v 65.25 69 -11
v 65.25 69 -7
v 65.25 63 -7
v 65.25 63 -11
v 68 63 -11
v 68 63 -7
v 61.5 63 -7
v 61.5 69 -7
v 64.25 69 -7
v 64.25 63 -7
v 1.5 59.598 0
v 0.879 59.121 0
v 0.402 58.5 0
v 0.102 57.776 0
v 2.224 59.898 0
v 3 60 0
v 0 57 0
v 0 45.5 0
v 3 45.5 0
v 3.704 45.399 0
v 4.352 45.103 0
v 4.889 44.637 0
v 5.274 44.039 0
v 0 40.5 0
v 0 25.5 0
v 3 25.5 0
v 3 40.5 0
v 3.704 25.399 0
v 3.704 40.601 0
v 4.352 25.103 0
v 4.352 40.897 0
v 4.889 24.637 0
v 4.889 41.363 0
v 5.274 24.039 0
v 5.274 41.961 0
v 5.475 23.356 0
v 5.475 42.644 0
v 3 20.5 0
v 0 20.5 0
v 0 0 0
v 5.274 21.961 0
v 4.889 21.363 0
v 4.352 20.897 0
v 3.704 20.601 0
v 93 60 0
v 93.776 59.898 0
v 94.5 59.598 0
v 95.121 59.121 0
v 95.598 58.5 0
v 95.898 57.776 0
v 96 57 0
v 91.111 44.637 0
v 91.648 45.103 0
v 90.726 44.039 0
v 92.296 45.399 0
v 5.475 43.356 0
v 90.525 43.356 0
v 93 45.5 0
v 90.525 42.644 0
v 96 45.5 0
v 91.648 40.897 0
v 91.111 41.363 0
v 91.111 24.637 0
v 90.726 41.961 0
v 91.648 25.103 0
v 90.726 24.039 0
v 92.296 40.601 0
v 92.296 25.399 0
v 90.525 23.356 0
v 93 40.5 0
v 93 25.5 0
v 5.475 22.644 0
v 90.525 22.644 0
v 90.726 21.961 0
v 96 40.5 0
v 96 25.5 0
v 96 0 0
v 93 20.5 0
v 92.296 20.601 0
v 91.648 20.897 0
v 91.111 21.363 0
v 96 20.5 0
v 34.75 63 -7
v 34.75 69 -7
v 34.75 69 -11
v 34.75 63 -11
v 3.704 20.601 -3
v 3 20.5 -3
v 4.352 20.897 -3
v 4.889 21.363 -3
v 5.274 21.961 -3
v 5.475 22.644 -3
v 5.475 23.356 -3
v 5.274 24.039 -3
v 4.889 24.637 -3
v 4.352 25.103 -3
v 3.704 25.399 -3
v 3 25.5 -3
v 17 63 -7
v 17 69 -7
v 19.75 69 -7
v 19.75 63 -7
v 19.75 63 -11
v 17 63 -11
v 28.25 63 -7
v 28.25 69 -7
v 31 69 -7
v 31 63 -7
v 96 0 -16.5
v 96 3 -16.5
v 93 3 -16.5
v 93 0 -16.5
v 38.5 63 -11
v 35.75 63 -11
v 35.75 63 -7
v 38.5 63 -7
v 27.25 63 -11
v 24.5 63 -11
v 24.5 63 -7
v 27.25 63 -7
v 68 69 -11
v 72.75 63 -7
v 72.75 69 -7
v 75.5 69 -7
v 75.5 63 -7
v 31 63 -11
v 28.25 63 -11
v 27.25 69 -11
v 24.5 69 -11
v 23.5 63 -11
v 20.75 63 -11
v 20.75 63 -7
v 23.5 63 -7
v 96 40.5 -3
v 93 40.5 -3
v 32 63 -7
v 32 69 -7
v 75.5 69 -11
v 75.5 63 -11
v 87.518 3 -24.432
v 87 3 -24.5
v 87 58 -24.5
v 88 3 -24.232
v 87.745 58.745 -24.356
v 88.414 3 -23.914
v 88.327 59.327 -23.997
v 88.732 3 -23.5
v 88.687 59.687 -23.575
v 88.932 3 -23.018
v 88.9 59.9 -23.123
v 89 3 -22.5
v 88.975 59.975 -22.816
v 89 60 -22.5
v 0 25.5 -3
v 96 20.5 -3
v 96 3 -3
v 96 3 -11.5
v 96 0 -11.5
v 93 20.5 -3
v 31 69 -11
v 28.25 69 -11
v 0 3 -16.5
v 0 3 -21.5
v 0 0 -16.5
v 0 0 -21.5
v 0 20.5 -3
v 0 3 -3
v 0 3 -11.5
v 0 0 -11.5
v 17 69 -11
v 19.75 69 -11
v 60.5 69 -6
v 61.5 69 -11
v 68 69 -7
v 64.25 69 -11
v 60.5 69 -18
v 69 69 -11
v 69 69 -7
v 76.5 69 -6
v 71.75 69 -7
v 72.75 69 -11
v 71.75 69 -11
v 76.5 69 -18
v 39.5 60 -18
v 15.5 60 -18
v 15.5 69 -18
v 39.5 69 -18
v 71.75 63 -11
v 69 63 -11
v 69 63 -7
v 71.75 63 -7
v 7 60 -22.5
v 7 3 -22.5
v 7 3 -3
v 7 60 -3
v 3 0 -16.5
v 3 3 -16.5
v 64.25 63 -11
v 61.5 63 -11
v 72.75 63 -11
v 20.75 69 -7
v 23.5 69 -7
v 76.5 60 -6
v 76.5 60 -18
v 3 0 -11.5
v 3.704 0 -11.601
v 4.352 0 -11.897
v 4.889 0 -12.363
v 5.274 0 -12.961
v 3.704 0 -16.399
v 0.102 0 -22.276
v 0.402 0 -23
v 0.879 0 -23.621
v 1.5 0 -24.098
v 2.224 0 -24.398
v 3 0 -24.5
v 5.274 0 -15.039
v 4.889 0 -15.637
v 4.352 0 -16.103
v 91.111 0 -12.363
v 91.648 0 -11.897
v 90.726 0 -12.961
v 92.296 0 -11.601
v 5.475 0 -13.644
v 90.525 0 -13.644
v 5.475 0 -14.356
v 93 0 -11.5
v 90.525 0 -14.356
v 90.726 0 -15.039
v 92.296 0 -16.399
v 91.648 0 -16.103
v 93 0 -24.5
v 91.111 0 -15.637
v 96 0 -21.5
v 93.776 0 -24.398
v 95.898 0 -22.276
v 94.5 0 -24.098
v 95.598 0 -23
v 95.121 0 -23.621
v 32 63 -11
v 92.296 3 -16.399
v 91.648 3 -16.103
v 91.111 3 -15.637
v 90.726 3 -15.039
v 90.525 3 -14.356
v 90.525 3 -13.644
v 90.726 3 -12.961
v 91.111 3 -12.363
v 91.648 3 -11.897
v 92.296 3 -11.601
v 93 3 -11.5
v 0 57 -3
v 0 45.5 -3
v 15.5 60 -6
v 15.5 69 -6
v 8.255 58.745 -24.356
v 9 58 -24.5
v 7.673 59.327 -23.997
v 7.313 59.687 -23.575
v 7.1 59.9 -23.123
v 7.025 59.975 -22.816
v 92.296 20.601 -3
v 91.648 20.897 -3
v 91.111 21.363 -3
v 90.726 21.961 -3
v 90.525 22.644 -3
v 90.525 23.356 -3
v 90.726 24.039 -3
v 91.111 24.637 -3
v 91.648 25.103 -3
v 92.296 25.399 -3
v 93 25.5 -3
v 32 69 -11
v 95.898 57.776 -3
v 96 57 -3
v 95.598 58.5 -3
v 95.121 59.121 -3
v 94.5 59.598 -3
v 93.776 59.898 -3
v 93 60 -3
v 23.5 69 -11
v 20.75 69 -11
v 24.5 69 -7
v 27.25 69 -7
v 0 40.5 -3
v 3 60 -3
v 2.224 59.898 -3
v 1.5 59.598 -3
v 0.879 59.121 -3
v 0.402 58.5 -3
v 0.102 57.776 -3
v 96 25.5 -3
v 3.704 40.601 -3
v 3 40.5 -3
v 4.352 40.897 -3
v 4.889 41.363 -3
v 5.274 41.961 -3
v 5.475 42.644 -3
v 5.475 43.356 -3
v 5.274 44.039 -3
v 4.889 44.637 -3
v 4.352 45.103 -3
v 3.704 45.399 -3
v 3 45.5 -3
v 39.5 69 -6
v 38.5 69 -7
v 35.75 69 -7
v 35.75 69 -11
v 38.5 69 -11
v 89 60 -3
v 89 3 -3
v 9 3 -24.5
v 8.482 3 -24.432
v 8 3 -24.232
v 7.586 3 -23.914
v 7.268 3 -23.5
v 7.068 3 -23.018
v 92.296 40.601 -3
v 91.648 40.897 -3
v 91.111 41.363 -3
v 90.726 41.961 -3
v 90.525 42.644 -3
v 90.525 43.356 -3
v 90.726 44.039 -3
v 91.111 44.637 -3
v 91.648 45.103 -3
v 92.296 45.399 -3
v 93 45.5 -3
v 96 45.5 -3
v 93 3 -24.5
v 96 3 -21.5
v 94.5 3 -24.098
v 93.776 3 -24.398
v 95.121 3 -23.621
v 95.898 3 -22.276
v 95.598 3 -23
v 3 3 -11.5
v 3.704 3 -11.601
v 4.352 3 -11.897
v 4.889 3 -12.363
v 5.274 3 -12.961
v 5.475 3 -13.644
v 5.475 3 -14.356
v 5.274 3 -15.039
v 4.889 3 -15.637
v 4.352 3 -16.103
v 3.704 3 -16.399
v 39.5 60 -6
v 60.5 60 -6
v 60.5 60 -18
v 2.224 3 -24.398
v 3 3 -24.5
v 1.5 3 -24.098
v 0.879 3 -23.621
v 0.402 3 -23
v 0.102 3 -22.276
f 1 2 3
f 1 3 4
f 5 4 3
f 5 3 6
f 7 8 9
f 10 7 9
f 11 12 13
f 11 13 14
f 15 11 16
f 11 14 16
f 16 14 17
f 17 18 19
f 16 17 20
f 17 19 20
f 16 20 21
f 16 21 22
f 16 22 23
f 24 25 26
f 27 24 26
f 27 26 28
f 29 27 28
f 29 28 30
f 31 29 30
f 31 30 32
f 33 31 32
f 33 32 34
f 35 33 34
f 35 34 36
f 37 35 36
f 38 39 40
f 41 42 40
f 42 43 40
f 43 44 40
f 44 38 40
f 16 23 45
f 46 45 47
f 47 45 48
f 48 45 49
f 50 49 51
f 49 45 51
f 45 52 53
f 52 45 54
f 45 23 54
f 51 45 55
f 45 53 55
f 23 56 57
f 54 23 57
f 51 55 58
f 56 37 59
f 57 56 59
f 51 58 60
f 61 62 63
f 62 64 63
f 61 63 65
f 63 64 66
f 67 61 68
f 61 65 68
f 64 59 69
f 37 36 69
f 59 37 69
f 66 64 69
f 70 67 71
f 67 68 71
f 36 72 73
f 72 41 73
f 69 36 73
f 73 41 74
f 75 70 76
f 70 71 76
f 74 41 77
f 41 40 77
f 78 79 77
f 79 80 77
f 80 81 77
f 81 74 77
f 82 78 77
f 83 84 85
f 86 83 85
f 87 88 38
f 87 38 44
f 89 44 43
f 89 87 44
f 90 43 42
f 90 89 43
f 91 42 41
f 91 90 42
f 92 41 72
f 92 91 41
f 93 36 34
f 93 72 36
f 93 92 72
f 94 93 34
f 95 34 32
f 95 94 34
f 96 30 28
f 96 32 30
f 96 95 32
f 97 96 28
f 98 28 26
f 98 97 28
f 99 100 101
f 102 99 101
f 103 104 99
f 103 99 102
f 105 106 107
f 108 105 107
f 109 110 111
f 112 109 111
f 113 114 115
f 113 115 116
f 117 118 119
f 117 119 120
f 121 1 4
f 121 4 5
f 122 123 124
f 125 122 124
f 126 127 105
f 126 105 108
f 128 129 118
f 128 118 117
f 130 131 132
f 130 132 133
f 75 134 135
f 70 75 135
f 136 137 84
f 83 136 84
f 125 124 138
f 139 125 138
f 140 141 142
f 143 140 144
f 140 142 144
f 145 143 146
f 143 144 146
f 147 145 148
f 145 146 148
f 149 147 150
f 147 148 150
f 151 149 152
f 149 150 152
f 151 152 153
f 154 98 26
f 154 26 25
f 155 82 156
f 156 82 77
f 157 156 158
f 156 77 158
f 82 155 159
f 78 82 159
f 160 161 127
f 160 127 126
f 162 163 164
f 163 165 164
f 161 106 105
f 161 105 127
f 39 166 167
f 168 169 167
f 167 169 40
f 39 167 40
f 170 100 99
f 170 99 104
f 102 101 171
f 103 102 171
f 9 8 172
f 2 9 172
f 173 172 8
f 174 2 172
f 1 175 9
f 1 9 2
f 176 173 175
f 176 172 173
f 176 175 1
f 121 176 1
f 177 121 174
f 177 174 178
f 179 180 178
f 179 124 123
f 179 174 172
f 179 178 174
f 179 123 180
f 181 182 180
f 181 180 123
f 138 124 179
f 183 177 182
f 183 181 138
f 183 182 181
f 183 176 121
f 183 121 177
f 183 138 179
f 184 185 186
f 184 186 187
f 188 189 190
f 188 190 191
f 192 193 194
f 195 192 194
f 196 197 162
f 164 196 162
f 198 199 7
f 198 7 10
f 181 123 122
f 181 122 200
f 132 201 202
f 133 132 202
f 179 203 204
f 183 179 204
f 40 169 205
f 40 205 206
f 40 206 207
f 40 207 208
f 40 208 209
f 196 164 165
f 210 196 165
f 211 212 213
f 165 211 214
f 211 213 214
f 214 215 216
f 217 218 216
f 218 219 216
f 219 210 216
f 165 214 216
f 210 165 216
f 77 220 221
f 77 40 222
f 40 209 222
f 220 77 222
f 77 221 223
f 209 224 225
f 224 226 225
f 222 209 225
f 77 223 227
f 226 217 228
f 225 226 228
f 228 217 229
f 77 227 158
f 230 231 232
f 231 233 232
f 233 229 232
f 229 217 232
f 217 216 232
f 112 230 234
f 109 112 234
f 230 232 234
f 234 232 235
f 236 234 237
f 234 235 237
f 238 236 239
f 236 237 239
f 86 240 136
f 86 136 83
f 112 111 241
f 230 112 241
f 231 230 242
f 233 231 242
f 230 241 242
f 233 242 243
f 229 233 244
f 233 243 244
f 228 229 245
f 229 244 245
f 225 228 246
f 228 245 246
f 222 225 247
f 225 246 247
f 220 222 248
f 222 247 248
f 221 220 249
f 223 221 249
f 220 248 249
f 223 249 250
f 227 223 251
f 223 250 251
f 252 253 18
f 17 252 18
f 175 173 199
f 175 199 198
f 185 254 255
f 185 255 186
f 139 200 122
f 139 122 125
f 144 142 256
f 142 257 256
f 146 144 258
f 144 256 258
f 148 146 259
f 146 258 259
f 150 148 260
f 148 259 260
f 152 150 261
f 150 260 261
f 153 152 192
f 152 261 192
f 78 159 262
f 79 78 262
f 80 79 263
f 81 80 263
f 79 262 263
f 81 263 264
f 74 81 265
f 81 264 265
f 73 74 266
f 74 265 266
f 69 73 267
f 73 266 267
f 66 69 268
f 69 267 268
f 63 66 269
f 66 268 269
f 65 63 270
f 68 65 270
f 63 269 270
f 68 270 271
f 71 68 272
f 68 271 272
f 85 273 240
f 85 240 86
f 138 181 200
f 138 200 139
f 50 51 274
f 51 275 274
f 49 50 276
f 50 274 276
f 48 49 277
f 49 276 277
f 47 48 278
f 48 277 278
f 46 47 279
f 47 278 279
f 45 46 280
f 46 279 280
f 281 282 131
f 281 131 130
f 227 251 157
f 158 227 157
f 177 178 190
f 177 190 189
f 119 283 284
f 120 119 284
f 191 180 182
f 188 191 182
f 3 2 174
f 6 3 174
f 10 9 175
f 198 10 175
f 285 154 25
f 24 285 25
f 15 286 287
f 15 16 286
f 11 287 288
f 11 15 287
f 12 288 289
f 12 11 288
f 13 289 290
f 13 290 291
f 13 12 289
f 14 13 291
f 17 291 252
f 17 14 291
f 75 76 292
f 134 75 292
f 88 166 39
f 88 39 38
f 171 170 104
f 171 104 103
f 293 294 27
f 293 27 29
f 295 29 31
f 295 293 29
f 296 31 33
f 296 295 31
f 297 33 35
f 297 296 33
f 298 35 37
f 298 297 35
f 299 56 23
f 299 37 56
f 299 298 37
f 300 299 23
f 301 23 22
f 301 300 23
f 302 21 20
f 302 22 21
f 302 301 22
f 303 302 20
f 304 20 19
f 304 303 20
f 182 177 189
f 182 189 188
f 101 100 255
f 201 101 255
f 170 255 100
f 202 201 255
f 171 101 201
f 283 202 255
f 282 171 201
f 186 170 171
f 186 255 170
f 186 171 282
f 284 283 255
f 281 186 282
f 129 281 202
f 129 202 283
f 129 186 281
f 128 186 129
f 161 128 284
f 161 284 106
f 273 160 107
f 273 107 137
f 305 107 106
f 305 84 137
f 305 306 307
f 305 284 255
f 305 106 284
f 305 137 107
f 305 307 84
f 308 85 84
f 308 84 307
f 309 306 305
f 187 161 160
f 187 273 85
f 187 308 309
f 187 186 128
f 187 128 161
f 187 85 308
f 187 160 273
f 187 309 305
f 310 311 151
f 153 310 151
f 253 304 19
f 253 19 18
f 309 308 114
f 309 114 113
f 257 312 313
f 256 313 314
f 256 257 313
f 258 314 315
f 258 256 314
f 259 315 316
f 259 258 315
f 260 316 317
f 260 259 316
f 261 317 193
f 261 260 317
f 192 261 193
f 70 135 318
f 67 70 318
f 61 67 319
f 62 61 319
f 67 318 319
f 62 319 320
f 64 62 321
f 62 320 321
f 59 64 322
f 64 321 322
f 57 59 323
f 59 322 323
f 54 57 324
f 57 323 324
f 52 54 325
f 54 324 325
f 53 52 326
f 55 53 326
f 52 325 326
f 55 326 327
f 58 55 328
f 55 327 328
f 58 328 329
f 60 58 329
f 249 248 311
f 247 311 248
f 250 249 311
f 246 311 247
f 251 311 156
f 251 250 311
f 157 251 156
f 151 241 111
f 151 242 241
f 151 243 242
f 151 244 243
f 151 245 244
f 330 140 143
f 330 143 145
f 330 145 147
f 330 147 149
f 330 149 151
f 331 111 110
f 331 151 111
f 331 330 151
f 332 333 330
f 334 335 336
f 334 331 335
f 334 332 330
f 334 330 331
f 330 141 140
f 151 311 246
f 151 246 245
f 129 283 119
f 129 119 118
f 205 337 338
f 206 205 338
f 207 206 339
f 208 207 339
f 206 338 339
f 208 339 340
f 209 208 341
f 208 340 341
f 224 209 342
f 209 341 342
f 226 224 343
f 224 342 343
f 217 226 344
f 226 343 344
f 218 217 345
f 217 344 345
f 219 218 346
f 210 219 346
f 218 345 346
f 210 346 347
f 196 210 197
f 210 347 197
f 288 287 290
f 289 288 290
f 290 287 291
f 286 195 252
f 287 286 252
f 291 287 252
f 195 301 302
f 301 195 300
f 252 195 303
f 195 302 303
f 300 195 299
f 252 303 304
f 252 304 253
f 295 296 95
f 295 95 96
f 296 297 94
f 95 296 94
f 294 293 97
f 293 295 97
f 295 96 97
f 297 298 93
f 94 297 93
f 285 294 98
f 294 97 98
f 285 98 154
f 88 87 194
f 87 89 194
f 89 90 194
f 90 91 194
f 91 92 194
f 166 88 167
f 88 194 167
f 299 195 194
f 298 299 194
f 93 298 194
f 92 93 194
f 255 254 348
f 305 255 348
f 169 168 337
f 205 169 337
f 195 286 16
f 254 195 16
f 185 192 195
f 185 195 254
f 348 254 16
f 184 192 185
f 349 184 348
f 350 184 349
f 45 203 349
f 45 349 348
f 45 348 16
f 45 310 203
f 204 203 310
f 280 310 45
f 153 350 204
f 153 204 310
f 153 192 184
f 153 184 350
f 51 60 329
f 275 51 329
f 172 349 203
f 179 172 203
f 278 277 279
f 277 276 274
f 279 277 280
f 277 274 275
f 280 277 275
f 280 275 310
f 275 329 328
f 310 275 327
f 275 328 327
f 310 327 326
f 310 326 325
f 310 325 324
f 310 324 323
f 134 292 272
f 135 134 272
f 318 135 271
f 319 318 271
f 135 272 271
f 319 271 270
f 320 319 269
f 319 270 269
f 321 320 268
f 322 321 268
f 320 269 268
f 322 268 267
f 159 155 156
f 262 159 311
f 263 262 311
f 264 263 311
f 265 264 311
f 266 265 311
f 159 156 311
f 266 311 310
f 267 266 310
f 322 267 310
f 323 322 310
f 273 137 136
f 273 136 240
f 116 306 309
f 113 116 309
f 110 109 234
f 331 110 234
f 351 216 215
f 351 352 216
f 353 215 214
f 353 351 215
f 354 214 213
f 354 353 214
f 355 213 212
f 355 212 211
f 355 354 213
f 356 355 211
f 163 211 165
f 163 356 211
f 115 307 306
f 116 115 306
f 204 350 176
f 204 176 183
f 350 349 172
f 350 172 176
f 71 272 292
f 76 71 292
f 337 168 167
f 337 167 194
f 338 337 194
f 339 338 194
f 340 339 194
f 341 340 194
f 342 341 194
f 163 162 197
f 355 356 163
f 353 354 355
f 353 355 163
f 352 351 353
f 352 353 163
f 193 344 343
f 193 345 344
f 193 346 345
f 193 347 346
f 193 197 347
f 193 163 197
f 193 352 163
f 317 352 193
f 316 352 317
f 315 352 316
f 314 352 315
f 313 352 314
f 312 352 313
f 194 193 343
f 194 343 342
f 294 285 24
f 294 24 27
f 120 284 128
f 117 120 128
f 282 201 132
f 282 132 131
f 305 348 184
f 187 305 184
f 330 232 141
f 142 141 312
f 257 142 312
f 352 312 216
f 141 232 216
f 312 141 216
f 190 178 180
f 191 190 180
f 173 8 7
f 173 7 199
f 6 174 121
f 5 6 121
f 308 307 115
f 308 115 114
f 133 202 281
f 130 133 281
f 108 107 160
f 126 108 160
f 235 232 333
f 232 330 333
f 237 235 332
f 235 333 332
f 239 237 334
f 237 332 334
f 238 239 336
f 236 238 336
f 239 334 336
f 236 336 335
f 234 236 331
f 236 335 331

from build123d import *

# Parameters (mm, degrees)
SKETCH1_W           = 96
SKETCH1_H           = 24.5
BOSS_EXTRUDE1_DEPTH = 3
BOSS_EXTRUDE2_DEPTH = 57
FILLET1_R           = 2
FILLET2_R           = 3
CUT_EXTRUDE1_REACH  = 117.231
CUT_EXTRUDE2_REACH  = 116.303
SKETCH5_W           = 16
SKETCH5_H           = 12
SKETCH5_W_2         = 24
BOSS_EXTRUDE3_DEPTH = 9
SKETCH6_W           = 2.75
SKETCH6_H           = 4
CUT_EXTRUDE3_DEPTH  = 6
LPATTERN1_COUNT     = 4
LPATTERN1_PITCH     = 3.75
SKETCH7_W           = 2.75
SKETCH7_H           = 4
CUT_EXTRUDE4_DEPTH  = 6
LPATTERN2_COUNT     = 6
LPATTERN2_PITCH     = 3.75


with BuildPart() as part:
    # Sketch1 → Boss-Extrude1 (new body)
    with BuildSketch(Plane(origin=(0, 0, 0), x_dir=(1, 0, 0), z_dir=(0, 1, 0))):
        with Locations((48, 12.25)):
            Rectangle(SKETCH1_W, SKETCH1_H)
    extrude(amount=BOSS_EXTRUDE1_DEPTH)

    # Sketch2 → Boss-Extrude2 (add)
    with BuildSketch(Plane(origin=(0, 3, 0), x_dir=(1, 0, 0), z_dir=(0, 1, 0))):
        Polygon((0, 0), (96, 0), (96, 3), (89, 3), (89, 24.5), (7, 24.5), (7, 3), (0, 3), align=None)
    extrude(amount=BOSS_EXTRUDE2_DEPTH)

    # Fillet1
    fillet1_edges = [part.edges().sort_by_distance(p)[0] for p in [
        (89, 31.5, -24.5),
        (7, 31.5, -24.5),
        (48, 60, -24.5),
    ]]
    fillet(fillet1_edges, radius=FILLET1_R)

    # Fillet2
    fillet2_edges = [part.edges().sort_by_distance(p)[0] for p in [
        (0, 60, -1.5),
        (96, 60, -1.5),
        (0, 1.5, -24.5),
        (96, 1.5, -24.5),
    ]]
    fillet(fillet2_edges, radius=FILLET2_R)

    # Sketch3 → Cut-Extrude1 (cut, up to next)
    with BuildSketch(Plane(origin=(0, 0, -3), x_dir=(-1, 0, 0), z_dir=(0, 0, -1)), mode=Mode.PRIVATE) as cut_extrude1_sk1:
        with BuildLine():
            Line((-93, 45.5), (-96, 45.5))
            Line((-96, 45.5), (-96, 40.5))
            Line((-96, 40.5), (-93, 40.5))
            ThreePointArc((-93, 40.5), (-90.5, 43), (-93, 45.5))
        make_face()
    cut_extrude1_tool1 = extrude(cut_extrude1_sk1.sketch, amount=-CUT_EXTRUDE1_REACH, mode=Mode.PRIVATE) & part.part
    # Sketch3 → Cut-Extrude1 (cut, up to next)
    with BuildSketch(Plane(origin=(0, 0, -3), x_dir=(-1, 0, 0), z_dir=(0, 0, -1)), mode=Mode.PRIVATE) as cut_extrude1_sk2:
        with BuildLine():
            Line((-93, 25.5), (-96, 25.5))
            Line((-96, 25.5), (-96, 20.5))
            Line((-96, 20.5), (-93, 20.5))
            ThreePointArc((-93, 20.5), (-90.5, 23), (-93, 25.5))
        make_face()
    cut_extrude1_tool2 = extrude(cut_extrude1_sk2.sketch, amount=-CUT_EXTRUDE1_REACH, mode=Mode.PRIVATE) & part.part
    # Sketch3 → Cut-Extrude1 (cut, up to next)
    with BuildSketch(Plane(origin=(0, 0, -3), x_dir=(-1, 0, 0), z_dir=(0, 0, -1)), mode=Mode.PRIVATE) as cut_extrude1_sk3:
        with BuildLine():
            Line((-3, 25.5), (0, 25.5))
            Line((0, 25.5), (0, 20.5))
            Line((0, 20.5), (-3, 20.5))
            ThreePointArc((-3, 20.5), (-5.5, 23), (-3, 25.5))
        make_face()
    cut_extrude1_tool3 = extrude(cut_extrude1_sk3.sketch, amount=-CUT_EXTRUDE1_REACH, mode=Mode.PRIVATE) & part.part
    # Sketch3 → Cut-Extrude1 (cut, up to next)
    with BuildSketch(Plane(origin=(0, 0, -3), x_dir=(-1, 0, 0), z_dir=(0, 0, -1)), mode=Mode.PRIVATE) as cut_extrude1_sk4:
        with BuildLine():
            Line((-3, 45.5), (0, 45.5))
            Line((0, 45.5), (0, 40.5))
            Line((0, 40.5), (-3, 40.5))
            ThreePointArc((-3, 40.5), (-5.5, 43), (-3, 45.5))
        make_face()
    cut_extrude1_tool4 = extrude(cut_extrude1_sk4.sketch, amount=-CUT_EXTRUDE1_REACH, mode=Mode.PRIVATE) & part.part
    add(cut_extrude1_tool1.solids().sort_by_distance((93.486888, 43, -3))[0], mode=Mode.SUBTRACT)
    add(cut_extrude1_tool2.solids().sort_by_distance((93.486888, 23, -3))[0], mode=Mode.SUBTRACT)
    add(cut_extrude1_tool3.solids().sort_by_distance((2.513112, 23, -3))[0], mode=Mode.SUBTRACT)
    add(cut_extrude1_tool4.solids().sort_by_distance((2.513112, 43, -3))[0], mode=Mode.SUBTRACT)

    # Sketch4 → Cut-Extrude2 (cut, up to next)
    with BuildSketch(Plane(origin=(0, 3, 0), x_dir=(1, 0, 0), z_dir=(0, 1, 0)), mode=Mode.PRIVATE) as cut_extrude2_sk1:
        with BuildLine():
            Line((3, 16.5), (0, 16.5))
            Line((0, 16.5), (0, 11.5))
            Line((0, 11.5), (3, 11.5))
            ThreePointArc((3, 11.5), (5.5, 14), (3, 16.5))
        make_face()
    cut_extrude2_tool1 = extrude(cut_extrude2_sk1.sketch, amount=-CUT_EXTRUDE2_REACH, mode=Mode.PRIVATE) & part.part
    # Sketch4 → Cut-Extrude2 (cut, up to next)
    with BuildSketch(Plane(origin=(0, 3, 0), x_dir=(1, 0, 0), z_dir=(0, 1, 0)), mode=Mode.PRIVATE) as cut_extrude2_sk2:
        with BuildLine():
            Line((93, 11.5), (96, 11.5))
            Line((96, 11.5), (96, 16.5))
            Line((96, 16.5), (93, 16.5))
            ThreePointArc((93, 16.5), (90.5, 14), (93, 11.5))
        make_face()
    cut_extrude2_tool2 = extrude(cut_extrude2_sk2.sketch, amount=-CUT_EXTRUDE2_REACH, mode=Mode.PRIVATE) & part.part
    add(cut_extrude2_tool1.solids().sort_by_distance((2.513112, 3, -14))[0], mode=Mode.SUBTRACT)
    add(cut_extrude2_tool2.solids().sort_by_distance((93.486888, 3, -14))[0], mode=Mode.SUBTRACT)

    # Sketch5 → Boss-Extrude3 (add)
    with BuildSketch(Plane(origin=(0, 60, 0), x_dir=(1, 0, 0), z_dir=(0, 1, 0))):
        with Locations((68.5, 12)):
            Rectangle(SKETCH5_W, SKETCH5_H)
        with Locations((27.5, 12)):
            Rectangle(SKETCH5_W_2, SKETCH5_H)
    extrude(amount=BOSS_EXTRUDE3_DEPTH)

    # Sketch6 → Cut-Extrude3 (cut)
    with BuildSketch(Plane(origin=(0, 69, 0), x_dir=(1, 0, 0), z_dir=(0, 1, 0))):
        with Locations((74.125, 9)):
            Rectangle(SKETCH6_W, SKETCH6_H)
    cut_extrude3 = extrude(amount=-CUT_EXTRUDE3_DEPTH, mode=Mode.SUBTRACT)

    # LPattern1: Cut-Extrude3 ×4
    with Locations(*[(-i * LPATTERN1_PITCH, 0, 0) for i in range(1, LPATTERN1_COUNT)]):
        add(cut_extrude3, mode=Mode.SUBTRACT)

    # Sketch7 → Cut-Extrude4 (cut)
    with BuildSketch(Plane(origin=(0, 69, 0), x_dir=(1, 0, 0), z_dir=(0, 1, 0))):
        with Locations((37.125, 9)):
            Rectangle(SKETCH7_W, SKETCH7_H)
    cut_extrude4 = extrude(amount=-CUT_EXTRUDE4_DEPTH, mode=Mode.SUBTRACT)

    # LPattern2: Cut-Extrude4 ×6
    with Locations(*[(-i * LPATTERN2_PITCH, 0, 0) for i in range(1, LPATTERN2_COUNT)]):
        add(cut_extrude4, mode=Mode.SUBTRACT)


solid = part.part
